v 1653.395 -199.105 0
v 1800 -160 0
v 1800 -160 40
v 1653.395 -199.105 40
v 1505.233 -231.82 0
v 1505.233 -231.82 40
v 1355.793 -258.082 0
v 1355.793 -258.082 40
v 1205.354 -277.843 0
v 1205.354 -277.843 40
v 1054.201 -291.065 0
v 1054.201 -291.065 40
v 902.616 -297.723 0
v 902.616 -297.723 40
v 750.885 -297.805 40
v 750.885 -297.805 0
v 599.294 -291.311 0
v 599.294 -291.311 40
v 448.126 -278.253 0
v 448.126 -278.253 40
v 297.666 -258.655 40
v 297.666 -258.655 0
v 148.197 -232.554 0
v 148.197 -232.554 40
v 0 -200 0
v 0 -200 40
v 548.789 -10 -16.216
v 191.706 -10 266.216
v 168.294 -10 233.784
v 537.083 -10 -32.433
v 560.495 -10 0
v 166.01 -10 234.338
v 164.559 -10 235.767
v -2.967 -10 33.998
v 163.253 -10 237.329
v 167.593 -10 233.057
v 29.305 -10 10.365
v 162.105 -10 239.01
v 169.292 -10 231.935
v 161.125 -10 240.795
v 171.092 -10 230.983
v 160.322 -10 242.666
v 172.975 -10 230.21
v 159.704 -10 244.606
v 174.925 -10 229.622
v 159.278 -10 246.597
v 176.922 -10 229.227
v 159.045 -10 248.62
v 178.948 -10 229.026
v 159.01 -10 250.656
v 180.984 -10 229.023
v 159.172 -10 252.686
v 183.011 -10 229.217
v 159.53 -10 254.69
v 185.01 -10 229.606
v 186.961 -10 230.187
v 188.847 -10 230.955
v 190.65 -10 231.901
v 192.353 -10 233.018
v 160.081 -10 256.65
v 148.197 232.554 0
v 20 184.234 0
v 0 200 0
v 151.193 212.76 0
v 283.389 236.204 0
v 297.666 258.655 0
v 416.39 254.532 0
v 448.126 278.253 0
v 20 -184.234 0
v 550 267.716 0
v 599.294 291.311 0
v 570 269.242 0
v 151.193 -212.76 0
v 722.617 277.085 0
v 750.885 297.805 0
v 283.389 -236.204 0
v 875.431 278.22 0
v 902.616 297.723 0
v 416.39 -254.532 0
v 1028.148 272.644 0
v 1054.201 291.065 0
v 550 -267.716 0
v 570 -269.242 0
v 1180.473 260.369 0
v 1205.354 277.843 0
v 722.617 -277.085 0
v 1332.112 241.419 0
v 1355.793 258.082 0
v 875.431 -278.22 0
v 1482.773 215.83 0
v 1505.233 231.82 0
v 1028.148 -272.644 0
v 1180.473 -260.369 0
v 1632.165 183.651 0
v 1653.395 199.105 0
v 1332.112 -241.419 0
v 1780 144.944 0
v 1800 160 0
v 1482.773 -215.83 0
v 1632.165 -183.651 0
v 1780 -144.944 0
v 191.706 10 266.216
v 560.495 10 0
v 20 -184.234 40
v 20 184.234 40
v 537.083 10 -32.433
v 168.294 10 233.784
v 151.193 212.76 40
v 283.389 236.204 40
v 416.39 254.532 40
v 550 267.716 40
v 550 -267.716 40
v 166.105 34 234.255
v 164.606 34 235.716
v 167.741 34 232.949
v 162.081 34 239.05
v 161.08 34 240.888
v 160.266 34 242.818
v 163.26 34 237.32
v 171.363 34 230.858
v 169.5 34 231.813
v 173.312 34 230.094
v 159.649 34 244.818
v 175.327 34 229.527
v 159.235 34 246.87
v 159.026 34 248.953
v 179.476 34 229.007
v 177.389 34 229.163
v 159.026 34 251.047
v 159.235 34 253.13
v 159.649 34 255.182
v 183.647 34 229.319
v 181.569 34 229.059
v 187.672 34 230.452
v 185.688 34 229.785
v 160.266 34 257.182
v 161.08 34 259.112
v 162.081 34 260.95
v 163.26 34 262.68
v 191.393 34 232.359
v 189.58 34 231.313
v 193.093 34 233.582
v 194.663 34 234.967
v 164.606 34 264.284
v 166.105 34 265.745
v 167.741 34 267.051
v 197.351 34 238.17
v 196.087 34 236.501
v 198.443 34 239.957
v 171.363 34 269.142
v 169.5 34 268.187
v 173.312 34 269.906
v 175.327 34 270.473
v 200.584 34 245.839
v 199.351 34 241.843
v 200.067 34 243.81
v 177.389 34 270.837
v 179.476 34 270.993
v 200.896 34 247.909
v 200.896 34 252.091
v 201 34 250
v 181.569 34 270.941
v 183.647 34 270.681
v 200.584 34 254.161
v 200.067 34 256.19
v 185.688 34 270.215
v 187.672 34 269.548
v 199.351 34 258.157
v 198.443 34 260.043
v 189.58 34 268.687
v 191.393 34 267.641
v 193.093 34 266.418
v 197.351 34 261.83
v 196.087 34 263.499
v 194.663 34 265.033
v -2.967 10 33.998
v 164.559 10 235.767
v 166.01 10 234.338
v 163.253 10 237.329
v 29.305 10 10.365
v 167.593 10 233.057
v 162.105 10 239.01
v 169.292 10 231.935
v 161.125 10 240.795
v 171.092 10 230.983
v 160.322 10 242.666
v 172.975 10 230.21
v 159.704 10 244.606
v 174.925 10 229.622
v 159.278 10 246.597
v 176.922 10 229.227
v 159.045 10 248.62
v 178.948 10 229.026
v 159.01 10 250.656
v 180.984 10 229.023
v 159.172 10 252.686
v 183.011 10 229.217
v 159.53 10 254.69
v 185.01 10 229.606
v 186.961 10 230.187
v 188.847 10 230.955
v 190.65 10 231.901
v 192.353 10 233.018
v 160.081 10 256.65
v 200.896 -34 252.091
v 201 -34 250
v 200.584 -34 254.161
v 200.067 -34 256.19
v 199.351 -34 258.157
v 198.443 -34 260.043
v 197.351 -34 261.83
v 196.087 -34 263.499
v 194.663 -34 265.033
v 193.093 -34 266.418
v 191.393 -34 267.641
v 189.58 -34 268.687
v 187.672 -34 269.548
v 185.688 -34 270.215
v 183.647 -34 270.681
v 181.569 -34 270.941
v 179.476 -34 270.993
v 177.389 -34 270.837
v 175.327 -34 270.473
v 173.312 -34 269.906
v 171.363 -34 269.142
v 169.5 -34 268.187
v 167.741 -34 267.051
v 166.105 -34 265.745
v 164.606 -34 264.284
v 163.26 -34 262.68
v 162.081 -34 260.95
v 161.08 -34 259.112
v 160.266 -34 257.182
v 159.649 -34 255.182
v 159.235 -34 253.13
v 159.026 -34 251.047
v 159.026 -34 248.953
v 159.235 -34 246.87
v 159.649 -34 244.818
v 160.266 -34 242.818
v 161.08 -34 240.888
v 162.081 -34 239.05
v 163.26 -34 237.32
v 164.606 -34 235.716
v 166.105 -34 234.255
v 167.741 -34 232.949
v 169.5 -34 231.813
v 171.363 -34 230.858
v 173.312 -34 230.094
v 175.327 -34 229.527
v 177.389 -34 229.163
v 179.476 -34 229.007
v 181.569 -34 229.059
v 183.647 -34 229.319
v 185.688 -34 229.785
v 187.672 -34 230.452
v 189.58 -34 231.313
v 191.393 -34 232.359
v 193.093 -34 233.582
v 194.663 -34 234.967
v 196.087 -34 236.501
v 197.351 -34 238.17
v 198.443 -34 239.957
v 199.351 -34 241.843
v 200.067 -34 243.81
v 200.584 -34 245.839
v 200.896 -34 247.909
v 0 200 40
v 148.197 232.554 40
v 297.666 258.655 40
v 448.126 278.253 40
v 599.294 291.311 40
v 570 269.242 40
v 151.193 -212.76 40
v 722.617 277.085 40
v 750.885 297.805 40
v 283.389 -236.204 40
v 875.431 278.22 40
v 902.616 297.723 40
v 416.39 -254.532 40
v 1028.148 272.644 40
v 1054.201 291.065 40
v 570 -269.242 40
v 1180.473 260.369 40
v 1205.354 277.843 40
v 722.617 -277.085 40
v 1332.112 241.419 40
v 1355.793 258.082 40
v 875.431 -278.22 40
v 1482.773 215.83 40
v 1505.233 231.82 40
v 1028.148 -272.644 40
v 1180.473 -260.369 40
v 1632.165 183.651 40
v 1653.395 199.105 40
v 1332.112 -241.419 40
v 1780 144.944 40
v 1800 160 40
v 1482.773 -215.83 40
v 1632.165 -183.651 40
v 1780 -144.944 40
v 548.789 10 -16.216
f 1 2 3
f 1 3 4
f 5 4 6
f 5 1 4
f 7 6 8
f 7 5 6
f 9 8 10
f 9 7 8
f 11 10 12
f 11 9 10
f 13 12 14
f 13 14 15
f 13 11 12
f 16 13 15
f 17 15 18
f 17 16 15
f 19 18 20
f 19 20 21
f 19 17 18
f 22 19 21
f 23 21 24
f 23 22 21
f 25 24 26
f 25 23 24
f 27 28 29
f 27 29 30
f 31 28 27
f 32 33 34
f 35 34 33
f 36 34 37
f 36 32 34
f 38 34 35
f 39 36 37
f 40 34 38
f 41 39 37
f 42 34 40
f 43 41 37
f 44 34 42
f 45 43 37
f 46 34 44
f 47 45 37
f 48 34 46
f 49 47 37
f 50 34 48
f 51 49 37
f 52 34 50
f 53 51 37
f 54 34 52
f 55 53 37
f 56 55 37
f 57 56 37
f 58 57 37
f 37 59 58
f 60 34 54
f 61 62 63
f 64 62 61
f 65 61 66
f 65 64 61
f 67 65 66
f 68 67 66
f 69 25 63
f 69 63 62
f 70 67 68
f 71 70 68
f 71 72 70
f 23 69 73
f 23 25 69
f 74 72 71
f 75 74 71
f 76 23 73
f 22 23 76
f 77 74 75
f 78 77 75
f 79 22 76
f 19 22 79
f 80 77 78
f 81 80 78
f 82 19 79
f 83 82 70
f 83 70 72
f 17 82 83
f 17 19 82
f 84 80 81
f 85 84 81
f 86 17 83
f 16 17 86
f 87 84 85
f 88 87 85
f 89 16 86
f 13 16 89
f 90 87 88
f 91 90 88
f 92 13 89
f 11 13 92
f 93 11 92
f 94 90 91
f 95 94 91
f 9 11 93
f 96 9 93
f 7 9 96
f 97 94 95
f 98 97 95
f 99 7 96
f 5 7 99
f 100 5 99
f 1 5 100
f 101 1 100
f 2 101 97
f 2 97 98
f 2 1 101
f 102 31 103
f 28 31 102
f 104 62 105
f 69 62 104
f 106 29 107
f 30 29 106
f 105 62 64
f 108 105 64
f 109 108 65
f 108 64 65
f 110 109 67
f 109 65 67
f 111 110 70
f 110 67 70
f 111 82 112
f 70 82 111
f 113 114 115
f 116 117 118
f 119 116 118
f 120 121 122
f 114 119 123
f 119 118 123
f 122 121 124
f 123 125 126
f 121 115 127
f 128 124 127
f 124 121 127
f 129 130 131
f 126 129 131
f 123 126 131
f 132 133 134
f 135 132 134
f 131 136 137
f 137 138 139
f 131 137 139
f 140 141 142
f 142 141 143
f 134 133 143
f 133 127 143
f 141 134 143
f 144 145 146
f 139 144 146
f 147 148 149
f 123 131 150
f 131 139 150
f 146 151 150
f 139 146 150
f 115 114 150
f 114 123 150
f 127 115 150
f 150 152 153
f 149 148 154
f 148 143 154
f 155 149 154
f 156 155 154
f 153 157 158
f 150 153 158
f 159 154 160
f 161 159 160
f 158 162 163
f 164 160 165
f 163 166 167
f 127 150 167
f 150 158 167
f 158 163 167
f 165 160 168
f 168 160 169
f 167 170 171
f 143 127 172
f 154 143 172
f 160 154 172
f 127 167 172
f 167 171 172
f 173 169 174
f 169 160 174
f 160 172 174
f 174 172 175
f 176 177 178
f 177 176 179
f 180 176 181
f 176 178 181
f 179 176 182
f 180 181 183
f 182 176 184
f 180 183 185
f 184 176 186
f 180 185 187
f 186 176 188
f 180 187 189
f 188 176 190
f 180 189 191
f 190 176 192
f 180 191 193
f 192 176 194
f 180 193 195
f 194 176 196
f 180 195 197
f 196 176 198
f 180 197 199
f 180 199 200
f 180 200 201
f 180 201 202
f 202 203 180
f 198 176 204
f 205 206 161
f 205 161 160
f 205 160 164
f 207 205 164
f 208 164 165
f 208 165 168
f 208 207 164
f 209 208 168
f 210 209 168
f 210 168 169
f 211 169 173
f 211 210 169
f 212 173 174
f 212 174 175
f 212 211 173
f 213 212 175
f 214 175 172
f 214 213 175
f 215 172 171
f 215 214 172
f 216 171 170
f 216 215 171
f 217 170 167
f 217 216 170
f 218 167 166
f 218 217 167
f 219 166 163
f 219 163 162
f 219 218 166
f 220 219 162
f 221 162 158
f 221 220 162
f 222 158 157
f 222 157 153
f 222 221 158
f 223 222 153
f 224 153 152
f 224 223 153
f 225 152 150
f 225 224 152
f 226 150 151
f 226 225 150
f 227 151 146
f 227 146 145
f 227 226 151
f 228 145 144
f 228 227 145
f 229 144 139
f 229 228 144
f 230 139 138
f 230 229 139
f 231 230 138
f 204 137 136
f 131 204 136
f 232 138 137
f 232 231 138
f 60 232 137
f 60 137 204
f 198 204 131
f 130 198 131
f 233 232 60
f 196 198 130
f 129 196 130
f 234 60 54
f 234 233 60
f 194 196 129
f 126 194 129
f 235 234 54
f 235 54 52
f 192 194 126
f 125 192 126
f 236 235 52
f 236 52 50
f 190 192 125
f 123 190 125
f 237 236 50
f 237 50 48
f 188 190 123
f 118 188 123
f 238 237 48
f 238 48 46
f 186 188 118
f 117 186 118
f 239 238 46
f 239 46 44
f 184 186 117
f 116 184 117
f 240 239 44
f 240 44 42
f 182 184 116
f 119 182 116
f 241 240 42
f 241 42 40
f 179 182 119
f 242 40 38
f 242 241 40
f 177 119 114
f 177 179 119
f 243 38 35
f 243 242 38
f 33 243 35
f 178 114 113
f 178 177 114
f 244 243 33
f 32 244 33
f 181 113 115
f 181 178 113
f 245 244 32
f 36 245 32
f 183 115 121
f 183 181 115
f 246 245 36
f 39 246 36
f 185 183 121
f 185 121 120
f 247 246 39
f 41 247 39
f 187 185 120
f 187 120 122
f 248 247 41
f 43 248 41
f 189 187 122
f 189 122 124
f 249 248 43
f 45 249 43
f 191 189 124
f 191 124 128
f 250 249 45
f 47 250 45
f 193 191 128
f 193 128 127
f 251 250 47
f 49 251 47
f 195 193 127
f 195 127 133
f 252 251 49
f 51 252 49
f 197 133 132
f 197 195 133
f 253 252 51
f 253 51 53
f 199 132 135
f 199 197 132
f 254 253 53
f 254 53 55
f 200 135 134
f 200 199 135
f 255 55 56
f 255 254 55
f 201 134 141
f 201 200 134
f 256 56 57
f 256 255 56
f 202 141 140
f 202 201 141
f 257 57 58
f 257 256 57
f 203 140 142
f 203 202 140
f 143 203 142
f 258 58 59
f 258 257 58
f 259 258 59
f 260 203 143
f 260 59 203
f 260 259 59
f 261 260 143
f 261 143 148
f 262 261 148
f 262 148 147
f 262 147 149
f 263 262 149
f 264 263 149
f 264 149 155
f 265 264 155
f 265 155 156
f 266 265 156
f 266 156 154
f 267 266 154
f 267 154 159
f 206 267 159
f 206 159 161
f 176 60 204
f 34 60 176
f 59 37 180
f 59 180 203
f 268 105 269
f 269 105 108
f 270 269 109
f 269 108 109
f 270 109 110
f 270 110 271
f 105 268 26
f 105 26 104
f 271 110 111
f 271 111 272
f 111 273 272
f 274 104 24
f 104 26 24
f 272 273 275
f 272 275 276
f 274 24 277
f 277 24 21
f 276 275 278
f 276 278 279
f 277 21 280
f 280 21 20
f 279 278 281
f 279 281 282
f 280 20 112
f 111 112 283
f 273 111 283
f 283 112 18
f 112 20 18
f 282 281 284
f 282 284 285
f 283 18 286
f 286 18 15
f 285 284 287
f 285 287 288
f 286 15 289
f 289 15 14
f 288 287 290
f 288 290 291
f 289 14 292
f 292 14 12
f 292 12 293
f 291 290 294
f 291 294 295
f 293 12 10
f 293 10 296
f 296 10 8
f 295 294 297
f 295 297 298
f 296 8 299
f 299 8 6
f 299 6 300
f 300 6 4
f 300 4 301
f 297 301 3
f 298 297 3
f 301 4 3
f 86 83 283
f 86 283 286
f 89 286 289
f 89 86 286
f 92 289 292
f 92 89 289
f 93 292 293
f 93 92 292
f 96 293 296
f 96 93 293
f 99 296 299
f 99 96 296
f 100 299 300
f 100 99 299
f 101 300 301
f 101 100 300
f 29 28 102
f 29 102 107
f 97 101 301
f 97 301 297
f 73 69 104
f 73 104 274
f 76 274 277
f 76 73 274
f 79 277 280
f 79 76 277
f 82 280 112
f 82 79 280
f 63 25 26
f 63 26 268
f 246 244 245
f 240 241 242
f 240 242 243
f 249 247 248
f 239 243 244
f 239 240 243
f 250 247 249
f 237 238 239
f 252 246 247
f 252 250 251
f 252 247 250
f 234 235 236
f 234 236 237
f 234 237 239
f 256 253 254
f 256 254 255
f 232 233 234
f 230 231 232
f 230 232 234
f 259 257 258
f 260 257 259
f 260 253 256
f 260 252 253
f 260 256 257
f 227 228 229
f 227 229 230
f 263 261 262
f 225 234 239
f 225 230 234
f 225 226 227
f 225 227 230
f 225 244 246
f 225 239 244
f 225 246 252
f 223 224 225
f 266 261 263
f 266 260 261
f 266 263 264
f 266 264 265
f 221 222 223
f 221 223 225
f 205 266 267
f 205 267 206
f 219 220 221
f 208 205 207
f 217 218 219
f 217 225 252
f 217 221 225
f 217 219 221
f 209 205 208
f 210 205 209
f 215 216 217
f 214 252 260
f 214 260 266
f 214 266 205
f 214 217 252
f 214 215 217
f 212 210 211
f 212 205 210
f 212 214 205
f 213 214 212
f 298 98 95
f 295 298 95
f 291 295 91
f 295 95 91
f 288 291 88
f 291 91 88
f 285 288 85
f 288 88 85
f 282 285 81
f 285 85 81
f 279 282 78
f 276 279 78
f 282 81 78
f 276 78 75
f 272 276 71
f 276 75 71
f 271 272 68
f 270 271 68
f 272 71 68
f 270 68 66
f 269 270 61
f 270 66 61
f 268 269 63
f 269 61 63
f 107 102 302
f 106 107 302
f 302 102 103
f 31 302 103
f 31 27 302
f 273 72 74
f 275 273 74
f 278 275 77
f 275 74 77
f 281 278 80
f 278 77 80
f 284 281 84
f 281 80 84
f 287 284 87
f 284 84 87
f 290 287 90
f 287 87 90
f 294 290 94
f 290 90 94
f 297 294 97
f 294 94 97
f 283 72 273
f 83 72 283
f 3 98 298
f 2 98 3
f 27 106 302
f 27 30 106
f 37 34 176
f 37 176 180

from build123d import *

# Parameters (mm, degrees)
F1_DEPTH = 40
F3_R     = 21
F4_DEPTH = 34
F6_DEPTH = 10
F8_DEPTH = 10


with BuildPart() as f1:
    # F0 (on Top) → F1 (new body)
    with BuildSketch(Plane.XY):
        with BuildLine():
            Line((1800, 0), (1800, 160))
            ThreePointArc((1800, 160), (902.6160702853, 297.723162839), (0, 200))
            Line((0, 200), (0, 0))
            Line((0, 0), (20, 0))
            Line((20, 0), (20, 184.2338650593))
            ThreePointArc((20, 184.2338650593), (283.3887356677, 236.2041785507), (550, 267.7156572871))
            Line((550, 267.7156572871), (550, 0))
            Line((550, 0), (570, 0))
            Line((570, 0), (570, 269.2422609738))
            ThreePointArc((570, 269.2422609738), (1180.4728881109, 260.3694842678), (1780, 144.9436838818))
            Line((1780, 144.9436838818), (1780, 0))
            Line((1780, 0), (1800, 0))
        make_face()
    extrude(amount=F1_DEPTH)

    # F2: F1 across plane


with BuildPart() as f1_1:
    add(f1.part)
    add(f1.part.mirror(Plane.XZ))


with BuildPart() as f4:
    # F3 (on Front) → F4 (new body, symmetric)
    with BuildSketch(Plane.XZ):
        with Locations((180, 250)):
            Circle(F3_R)
    extrude(amount=F4_DEPTH, both=True)

    # F5 (on Front) → F6 (join, symmetric)
    with BuildSketch(Plane.XZ):
        Polygon((196.1360515255, 238.1835774803), (163.8639484745, 261.8164225197), (-2.9672317155, 33.9981877608), (29.3048713356, 10.3653427213), align=None)
    extrude(amount=F6_DEPTH, both=True)


with BuildPart() as f8:
    # F7 (on Front) → F8 (new body, symmetric)
    with BuildSketch(Plane.XZ):
        Polygon((560.4952573776, 0), (191.7060117653, 266.216327838), (180, 250), (548.7892456123, -16.216327838), align=None)
        Polygon((548.7892456123, -16.216327838), (180, 250), (168.2939882347, 233.783672162), (537.083233847, -32.4326556761), align=None)
    extrude(amount=F8_DEPTH, both=True)


solid = Compound([f1_1.part, f4.part, f8.part])
